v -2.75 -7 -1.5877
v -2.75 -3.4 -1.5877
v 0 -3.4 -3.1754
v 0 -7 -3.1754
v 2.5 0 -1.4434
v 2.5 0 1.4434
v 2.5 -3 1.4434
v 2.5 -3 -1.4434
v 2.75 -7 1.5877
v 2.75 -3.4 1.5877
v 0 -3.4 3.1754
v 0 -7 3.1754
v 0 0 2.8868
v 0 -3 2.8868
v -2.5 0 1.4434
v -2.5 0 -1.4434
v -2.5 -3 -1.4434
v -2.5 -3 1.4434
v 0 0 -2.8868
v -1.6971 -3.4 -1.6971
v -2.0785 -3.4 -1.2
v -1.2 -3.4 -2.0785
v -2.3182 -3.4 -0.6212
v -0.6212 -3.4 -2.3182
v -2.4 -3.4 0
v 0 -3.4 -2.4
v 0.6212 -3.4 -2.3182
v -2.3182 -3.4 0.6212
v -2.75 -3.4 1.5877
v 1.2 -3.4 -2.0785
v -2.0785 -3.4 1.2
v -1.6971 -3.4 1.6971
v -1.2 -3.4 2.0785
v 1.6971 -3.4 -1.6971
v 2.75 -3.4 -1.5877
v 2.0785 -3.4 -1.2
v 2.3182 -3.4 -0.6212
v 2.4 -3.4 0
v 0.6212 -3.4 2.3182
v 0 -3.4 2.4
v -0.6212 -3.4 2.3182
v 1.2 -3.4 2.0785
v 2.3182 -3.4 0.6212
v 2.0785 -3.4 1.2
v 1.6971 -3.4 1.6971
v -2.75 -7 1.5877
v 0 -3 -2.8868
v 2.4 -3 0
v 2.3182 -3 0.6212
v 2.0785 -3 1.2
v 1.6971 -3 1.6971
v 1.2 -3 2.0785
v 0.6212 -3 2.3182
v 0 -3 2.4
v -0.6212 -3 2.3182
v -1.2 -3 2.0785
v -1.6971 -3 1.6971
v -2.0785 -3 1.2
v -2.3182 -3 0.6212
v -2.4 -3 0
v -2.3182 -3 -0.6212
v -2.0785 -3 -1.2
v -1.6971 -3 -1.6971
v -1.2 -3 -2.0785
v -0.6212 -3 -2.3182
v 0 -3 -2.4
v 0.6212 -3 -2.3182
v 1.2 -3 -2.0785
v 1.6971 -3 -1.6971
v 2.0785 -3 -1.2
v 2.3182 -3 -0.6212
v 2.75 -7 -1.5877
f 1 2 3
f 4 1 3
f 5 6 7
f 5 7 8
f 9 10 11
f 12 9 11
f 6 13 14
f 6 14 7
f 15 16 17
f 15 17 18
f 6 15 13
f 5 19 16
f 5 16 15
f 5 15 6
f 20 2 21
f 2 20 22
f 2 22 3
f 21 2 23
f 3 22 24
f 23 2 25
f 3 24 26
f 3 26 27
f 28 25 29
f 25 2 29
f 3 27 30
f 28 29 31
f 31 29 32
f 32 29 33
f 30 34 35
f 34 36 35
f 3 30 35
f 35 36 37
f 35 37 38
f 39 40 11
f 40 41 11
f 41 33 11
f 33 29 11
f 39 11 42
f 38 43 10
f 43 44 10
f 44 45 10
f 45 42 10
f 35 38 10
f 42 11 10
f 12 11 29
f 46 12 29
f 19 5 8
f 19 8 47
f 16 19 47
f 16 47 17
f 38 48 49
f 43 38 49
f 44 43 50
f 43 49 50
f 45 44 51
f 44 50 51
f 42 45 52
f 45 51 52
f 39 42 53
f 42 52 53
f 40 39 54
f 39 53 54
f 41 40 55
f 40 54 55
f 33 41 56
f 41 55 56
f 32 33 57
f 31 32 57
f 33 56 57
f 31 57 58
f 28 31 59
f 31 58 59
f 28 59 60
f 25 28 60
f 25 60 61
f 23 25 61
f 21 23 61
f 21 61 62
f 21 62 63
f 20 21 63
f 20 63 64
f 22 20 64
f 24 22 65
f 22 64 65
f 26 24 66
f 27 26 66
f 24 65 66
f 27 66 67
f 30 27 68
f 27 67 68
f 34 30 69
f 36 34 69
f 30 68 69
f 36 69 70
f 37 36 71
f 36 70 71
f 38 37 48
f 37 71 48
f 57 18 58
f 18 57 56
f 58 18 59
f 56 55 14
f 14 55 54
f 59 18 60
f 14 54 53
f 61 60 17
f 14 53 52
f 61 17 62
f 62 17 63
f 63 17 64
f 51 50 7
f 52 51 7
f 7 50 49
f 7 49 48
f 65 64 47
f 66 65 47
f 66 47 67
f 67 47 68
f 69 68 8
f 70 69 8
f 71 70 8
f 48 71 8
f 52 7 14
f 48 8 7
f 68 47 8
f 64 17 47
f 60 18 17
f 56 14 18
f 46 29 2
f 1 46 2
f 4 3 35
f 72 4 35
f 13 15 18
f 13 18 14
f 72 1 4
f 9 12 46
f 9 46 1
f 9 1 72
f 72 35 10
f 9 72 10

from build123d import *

# Parameters (mm, degrees)
EXTRUDE_1_DEPTH = 3
SKETCH_3_R      = 2.4
EXTRUDE_2_DEPTH = 0.4
EXTRUDE_3_DEPTH = 3.6


with BuildPart() as part:
    # 草图2 → 凸台-拉伸1 (new body)
    with BuildSketch(Plane(origin=(0, 0, 0), x_dir=(1, 0, 0), z_dir=(0, 1, 0))):
        Polygon((0, -2.886751346), (2.5, -1.443375673), (2.5, 1.443375673), (0, 2.886751346), (-2.5, 1.443375673), (-2.5, -1.443375673), align=None)
    extrude(amount=-EXTRUDE_1_DEPTH)

    # 草图3 → 凸台-拉伸2 (add)
    with BuildSketch(Plane.XZ.offset(3)):
        Circle(SKETCH_3_R)
    extrude(amount=EXTRUDE_2_DEPTH)

    # 草图4 → 凸台-拉伸3 (add)
    with BuildSketch(Plane.XZ.offset(3.4)):
        Polygon((0, -3.175426481), (2.75, -1.58771324), (2.75, 1.58771324), (0, 3.175426481), (-2.75, 1.58771324), (-2.75, -1.58771324), align=None)
    extrude(amount=EXTRUDE_3_DEPTH)


solid = part.part
